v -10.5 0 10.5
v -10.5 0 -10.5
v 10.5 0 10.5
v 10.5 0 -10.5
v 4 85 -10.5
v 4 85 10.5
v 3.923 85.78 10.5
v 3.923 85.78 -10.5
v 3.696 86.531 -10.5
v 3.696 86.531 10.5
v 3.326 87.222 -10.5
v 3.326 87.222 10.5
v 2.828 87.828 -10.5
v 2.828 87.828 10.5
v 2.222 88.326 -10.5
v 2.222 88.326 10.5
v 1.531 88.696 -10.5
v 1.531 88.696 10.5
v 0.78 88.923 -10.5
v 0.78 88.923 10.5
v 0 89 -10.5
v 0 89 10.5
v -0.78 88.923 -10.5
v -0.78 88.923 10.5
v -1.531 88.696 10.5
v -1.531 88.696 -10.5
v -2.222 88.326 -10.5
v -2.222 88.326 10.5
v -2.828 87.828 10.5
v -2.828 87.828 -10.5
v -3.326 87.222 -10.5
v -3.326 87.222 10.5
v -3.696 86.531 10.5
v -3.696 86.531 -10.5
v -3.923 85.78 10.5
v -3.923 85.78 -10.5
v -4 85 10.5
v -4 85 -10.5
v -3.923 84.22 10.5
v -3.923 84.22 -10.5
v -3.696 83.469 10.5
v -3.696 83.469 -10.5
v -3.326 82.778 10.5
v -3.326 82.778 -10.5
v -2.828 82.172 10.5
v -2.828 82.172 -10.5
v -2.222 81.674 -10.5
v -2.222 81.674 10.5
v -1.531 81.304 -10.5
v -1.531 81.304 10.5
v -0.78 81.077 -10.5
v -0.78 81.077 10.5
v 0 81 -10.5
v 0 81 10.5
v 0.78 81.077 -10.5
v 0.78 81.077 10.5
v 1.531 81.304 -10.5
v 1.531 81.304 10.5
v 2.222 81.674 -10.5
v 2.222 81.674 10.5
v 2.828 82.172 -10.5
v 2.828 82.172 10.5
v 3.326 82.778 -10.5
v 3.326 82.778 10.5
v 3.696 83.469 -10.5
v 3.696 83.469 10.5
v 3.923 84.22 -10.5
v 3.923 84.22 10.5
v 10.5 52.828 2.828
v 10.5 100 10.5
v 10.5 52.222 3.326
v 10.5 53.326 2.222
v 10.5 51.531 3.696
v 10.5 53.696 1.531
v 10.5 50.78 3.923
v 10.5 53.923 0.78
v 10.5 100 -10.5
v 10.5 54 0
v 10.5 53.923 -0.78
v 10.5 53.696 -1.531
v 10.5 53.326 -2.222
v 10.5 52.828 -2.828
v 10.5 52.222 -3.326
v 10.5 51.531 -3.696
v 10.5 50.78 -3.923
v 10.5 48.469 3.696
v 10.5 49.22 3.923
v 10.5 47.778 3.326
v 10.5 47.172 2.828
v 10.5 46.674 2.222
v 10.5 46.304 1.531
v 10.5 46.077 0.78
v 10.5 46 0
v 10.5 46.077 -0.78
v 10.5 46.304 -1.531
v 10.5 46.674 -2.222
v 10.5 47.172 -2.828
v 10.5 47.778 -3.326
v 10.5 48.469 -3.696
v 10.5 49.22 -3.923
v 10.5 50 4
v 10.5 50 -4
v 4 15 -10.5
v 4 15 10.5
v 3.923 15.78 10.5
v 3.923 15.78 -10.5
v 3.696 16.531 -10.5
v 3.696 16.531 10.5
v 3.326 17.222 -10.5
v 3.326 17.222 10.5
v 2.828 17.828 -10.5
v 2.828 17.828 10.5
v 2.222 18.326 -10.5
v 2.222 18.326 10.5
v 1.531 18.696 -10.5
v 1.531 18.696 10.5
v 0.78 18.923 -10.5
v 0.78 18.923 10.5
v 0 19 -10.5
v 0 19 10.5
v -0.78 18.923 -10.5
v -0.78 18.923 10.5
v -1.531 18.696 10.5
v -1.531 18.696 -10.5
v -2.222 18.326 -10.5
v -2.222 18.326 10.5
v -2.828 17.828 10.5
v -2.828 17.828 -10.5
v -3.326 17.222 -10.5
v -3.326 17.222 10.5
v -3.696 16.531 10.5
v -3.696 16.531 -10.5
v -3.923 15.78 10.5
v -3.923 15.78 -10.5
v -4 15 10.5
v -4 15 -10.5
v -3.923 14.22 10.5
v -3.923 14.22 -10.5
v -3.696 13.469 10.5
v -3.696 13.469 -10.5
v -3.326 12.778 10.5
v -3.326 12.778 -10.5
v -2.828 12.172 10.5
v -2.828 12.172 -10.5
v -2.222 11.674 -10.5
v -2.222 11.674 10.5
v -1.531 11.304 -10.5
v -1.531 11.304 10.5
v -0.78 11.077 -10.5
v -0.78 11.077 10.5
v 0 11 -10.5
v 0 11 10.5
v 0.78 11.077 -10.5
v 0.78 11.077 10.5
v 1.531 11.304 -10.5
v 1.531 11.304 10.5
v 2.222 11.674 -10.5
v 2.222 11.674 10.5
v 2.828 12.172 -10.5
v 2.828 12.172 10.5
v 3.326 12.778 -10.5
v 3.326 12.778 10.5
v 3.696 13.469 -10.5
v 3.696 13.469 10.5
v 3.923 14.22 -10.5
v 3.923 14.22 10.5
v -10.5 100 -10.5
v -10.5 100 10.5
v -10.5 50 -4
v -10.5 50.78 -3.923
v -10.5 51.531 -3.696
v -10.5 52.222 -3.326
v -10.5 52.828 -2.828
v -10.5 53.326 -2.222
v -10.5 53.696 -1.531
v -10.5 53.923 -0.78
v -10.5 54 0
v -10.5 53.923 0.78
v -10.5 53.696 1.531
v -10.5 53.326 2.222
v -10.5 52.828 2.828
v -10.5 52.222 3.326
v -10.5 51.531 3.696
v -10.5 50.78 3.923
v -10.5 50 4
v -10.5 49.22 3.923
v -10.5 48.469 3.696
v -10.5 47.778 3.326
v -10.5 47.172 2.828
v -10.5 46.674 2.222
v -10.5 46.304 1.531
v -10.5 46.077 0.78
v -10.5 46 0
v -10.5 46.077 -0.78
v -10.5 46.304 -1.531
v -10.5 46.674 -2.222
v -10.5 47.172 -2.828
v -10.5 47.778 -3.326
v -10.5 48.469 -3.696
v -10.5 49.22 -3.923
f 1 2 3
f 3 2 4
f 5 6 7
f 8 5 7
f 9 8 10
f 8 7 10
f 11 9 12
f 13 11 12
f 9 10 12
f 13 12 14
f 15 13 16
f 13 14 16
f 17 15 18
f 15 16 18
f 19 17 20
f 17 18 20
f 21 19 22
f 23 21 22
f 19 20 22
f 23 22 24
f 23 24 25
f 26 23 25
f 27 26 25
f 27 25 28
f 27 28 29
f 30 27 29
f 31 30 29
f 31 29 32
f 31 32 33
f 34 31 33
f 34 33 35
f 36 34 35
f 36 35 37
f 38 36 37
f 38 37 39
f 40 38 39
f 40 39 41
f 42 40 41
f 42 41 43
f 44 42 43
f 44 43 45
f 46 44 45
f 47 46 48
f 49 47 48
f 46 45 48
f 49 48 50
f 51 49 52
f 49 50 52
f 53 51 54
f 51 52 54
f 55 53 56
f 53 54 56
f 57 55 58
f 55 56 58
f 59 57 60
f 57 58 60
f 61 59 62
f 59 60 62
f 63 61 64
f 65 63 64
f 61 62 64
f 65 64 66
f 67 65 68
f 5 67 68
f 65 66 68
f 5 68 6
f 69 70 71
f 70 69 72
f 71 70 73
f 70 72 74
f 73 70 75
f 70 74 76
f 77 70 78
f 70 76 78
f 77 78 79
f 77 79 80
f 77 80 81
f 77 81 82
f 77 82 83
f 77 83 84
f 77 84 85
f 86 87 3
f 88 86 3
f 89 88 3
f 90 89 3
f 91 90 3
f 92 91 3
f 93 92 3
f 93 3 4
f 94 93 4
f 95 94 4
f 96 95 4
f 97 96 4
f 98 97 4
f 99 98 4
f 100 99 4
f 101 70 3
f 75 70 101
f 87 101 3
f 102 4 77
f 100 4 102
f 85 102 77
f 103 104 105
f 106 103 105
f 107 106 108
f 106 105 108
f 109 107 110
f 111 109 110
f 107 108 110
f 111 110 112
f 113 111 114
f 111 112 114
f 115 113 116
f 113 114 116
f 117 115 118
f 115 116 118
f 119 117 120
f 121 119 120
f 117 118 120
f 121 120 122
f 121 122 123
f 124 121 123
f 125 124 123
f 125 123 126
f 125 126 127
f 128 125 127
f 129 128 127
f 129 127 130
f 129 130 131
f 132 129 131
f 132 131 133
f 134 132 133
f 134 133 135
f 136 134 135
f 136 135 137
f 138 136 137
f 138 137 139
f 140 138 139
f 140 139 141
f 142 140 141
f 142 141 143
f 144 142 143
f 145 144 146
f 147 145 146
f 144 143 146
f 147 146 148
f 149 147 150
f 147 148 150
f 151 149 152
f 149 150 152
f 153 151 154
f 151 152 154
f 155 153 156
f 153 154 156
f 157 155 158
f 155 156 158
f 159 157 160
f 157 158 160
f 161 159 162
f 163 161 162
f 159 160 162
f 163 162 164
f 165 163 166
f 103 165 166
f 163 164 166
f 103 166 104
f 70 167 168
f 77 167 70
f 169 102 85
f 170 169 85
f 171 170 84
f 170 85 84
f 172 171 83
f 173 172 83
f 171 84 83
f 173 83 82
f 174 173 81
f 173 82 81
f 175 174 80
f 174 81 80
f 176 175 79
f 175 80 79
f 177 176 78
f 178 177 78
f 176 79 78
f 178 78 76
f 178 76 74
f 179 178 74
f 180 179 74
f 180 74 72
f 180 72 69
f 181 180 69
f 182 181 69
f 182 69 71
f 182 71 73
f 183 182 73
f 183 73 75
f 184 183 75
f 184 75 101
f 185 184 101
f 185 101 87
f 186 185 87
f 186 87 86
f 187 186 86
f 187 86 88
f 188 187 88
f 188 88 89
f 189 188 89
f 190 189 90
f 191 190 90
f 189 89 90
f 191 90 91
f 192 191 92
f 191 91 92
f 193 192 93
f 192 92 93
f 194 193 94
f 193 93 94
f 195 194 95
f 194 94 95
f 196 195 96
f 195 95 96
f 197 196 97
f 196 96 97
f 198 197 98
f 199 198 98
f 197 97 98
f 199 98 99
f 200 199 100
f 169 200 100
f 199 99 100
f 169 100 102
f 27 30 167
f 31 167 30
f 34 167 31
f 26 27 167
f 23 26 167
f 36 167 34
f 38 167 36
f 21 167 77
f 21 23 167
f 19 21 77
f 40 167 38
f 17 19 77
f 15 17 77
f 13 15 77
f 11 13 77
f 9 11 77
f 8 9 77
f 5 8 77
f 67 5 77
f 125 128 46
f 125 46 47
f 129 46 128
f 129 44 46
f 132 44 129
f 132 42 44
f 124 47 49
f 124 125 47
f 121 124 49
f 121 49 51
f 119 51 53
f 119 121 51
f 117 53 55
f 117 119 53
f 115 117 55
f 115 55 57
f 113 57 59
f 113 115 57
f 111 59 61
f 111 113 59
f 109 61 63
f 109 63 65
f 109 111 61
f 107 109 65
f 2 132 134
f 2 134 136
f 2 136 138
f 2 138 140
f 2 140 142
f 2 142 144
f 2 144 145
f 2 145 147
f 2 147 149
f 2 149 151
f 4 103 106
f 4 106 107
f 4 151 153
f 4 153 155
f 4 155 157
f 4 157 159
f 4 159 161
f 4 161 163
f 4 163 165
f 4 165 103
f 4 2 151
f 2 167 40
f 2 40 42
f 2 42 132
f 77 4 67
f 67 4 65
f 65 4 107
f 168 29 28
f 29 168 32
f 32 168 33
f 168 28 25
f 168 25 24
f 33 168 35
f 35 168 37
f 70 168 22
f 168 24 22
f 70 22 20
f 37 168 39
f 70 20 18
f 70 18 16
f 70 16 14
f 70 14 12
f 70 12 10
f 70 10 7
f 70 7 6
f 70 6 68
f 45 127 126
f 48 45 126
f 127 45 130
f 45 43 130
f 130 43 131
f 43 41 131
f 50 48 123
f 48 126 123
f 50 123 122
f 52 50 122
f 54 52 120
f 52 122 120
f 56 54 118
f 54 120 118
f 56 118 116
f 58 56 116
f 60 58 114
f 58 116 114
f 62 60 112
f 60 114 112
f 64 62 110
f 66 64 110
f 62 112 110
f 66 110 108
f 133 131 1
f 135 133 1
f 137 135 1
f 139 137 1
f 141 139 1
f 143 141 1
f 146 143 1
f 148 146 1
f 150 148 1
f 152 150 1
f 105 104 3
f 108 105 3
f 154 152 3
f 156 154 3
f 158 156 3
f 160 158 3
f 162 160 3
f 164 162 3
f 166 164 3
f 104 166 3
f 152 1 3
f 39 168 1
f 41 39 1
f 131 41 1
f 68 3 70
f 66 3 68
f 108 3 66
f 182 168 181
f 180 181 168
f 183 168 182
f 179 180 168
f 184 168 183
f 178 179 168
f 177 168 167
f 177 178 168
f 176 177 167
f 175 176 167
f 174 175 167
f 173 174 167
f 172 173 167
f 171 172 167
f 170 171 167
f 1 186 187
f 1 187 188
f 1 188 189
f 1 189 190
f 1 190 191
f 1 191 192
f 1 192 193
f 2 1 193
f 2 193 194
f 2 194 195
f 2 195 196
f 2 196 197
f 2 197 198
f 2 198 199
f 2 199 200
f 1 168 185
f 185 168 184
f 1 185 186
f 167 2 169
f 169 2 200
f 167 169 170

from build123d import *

# Parameters (mm, degrees)
SKETCH1_W           = 21
SKETCH1_H           = 21
BOSS_EXTRUDE1_DEPTH = 100
SKETCH2_R           = 4
CUT_EXTRUDE1_DEPTH  = 103.719277645
SKETCH4_R           = 4
CUT_EXTRUDE2_DEPTH  = 103.719277645


with BuildPart() as part:
    # Sketch1 → Boss-Extrude1 (new body)
    with BuildSketch(Plane(origin=(0, 0, 0), x_dir=(1, 0, 0), z_dir=(0, 1, 0))):
        Rectangle(SKETCH1_W, SKETCH1_H)
    extrude(amount=BOSS_EXTRUDE1_DEPTH)

    # Sketch2 → Cut-Extrude1 (cut, through all)
    with BuildSketch(Plane.XY.offset(10.5)):
        with Locations((0, 85)):
            Circle(SKETCH2_R)
        with Locations((0, 15)):
            Circle(SKETCH2_R)
    extrude(amount=-CUT_EXTRUDE1_DEPTH, mode=Mode.SUBTRACT)

    # Sketch4 → Cut-Extrude2 (cut, through all)
    with BuildSketch(Plane(origin=(10.5, 0, 0), x_dir=(0, 0, -1), z_dir=(1, 0, 0))):
        with Locations((0, 50)):
            Circle(SKETCH4_R)
    extrude(amount=-CUT_EXTRUDE2_DEPTH, mode=Mode.SUBTRACT)


solid = part.part
